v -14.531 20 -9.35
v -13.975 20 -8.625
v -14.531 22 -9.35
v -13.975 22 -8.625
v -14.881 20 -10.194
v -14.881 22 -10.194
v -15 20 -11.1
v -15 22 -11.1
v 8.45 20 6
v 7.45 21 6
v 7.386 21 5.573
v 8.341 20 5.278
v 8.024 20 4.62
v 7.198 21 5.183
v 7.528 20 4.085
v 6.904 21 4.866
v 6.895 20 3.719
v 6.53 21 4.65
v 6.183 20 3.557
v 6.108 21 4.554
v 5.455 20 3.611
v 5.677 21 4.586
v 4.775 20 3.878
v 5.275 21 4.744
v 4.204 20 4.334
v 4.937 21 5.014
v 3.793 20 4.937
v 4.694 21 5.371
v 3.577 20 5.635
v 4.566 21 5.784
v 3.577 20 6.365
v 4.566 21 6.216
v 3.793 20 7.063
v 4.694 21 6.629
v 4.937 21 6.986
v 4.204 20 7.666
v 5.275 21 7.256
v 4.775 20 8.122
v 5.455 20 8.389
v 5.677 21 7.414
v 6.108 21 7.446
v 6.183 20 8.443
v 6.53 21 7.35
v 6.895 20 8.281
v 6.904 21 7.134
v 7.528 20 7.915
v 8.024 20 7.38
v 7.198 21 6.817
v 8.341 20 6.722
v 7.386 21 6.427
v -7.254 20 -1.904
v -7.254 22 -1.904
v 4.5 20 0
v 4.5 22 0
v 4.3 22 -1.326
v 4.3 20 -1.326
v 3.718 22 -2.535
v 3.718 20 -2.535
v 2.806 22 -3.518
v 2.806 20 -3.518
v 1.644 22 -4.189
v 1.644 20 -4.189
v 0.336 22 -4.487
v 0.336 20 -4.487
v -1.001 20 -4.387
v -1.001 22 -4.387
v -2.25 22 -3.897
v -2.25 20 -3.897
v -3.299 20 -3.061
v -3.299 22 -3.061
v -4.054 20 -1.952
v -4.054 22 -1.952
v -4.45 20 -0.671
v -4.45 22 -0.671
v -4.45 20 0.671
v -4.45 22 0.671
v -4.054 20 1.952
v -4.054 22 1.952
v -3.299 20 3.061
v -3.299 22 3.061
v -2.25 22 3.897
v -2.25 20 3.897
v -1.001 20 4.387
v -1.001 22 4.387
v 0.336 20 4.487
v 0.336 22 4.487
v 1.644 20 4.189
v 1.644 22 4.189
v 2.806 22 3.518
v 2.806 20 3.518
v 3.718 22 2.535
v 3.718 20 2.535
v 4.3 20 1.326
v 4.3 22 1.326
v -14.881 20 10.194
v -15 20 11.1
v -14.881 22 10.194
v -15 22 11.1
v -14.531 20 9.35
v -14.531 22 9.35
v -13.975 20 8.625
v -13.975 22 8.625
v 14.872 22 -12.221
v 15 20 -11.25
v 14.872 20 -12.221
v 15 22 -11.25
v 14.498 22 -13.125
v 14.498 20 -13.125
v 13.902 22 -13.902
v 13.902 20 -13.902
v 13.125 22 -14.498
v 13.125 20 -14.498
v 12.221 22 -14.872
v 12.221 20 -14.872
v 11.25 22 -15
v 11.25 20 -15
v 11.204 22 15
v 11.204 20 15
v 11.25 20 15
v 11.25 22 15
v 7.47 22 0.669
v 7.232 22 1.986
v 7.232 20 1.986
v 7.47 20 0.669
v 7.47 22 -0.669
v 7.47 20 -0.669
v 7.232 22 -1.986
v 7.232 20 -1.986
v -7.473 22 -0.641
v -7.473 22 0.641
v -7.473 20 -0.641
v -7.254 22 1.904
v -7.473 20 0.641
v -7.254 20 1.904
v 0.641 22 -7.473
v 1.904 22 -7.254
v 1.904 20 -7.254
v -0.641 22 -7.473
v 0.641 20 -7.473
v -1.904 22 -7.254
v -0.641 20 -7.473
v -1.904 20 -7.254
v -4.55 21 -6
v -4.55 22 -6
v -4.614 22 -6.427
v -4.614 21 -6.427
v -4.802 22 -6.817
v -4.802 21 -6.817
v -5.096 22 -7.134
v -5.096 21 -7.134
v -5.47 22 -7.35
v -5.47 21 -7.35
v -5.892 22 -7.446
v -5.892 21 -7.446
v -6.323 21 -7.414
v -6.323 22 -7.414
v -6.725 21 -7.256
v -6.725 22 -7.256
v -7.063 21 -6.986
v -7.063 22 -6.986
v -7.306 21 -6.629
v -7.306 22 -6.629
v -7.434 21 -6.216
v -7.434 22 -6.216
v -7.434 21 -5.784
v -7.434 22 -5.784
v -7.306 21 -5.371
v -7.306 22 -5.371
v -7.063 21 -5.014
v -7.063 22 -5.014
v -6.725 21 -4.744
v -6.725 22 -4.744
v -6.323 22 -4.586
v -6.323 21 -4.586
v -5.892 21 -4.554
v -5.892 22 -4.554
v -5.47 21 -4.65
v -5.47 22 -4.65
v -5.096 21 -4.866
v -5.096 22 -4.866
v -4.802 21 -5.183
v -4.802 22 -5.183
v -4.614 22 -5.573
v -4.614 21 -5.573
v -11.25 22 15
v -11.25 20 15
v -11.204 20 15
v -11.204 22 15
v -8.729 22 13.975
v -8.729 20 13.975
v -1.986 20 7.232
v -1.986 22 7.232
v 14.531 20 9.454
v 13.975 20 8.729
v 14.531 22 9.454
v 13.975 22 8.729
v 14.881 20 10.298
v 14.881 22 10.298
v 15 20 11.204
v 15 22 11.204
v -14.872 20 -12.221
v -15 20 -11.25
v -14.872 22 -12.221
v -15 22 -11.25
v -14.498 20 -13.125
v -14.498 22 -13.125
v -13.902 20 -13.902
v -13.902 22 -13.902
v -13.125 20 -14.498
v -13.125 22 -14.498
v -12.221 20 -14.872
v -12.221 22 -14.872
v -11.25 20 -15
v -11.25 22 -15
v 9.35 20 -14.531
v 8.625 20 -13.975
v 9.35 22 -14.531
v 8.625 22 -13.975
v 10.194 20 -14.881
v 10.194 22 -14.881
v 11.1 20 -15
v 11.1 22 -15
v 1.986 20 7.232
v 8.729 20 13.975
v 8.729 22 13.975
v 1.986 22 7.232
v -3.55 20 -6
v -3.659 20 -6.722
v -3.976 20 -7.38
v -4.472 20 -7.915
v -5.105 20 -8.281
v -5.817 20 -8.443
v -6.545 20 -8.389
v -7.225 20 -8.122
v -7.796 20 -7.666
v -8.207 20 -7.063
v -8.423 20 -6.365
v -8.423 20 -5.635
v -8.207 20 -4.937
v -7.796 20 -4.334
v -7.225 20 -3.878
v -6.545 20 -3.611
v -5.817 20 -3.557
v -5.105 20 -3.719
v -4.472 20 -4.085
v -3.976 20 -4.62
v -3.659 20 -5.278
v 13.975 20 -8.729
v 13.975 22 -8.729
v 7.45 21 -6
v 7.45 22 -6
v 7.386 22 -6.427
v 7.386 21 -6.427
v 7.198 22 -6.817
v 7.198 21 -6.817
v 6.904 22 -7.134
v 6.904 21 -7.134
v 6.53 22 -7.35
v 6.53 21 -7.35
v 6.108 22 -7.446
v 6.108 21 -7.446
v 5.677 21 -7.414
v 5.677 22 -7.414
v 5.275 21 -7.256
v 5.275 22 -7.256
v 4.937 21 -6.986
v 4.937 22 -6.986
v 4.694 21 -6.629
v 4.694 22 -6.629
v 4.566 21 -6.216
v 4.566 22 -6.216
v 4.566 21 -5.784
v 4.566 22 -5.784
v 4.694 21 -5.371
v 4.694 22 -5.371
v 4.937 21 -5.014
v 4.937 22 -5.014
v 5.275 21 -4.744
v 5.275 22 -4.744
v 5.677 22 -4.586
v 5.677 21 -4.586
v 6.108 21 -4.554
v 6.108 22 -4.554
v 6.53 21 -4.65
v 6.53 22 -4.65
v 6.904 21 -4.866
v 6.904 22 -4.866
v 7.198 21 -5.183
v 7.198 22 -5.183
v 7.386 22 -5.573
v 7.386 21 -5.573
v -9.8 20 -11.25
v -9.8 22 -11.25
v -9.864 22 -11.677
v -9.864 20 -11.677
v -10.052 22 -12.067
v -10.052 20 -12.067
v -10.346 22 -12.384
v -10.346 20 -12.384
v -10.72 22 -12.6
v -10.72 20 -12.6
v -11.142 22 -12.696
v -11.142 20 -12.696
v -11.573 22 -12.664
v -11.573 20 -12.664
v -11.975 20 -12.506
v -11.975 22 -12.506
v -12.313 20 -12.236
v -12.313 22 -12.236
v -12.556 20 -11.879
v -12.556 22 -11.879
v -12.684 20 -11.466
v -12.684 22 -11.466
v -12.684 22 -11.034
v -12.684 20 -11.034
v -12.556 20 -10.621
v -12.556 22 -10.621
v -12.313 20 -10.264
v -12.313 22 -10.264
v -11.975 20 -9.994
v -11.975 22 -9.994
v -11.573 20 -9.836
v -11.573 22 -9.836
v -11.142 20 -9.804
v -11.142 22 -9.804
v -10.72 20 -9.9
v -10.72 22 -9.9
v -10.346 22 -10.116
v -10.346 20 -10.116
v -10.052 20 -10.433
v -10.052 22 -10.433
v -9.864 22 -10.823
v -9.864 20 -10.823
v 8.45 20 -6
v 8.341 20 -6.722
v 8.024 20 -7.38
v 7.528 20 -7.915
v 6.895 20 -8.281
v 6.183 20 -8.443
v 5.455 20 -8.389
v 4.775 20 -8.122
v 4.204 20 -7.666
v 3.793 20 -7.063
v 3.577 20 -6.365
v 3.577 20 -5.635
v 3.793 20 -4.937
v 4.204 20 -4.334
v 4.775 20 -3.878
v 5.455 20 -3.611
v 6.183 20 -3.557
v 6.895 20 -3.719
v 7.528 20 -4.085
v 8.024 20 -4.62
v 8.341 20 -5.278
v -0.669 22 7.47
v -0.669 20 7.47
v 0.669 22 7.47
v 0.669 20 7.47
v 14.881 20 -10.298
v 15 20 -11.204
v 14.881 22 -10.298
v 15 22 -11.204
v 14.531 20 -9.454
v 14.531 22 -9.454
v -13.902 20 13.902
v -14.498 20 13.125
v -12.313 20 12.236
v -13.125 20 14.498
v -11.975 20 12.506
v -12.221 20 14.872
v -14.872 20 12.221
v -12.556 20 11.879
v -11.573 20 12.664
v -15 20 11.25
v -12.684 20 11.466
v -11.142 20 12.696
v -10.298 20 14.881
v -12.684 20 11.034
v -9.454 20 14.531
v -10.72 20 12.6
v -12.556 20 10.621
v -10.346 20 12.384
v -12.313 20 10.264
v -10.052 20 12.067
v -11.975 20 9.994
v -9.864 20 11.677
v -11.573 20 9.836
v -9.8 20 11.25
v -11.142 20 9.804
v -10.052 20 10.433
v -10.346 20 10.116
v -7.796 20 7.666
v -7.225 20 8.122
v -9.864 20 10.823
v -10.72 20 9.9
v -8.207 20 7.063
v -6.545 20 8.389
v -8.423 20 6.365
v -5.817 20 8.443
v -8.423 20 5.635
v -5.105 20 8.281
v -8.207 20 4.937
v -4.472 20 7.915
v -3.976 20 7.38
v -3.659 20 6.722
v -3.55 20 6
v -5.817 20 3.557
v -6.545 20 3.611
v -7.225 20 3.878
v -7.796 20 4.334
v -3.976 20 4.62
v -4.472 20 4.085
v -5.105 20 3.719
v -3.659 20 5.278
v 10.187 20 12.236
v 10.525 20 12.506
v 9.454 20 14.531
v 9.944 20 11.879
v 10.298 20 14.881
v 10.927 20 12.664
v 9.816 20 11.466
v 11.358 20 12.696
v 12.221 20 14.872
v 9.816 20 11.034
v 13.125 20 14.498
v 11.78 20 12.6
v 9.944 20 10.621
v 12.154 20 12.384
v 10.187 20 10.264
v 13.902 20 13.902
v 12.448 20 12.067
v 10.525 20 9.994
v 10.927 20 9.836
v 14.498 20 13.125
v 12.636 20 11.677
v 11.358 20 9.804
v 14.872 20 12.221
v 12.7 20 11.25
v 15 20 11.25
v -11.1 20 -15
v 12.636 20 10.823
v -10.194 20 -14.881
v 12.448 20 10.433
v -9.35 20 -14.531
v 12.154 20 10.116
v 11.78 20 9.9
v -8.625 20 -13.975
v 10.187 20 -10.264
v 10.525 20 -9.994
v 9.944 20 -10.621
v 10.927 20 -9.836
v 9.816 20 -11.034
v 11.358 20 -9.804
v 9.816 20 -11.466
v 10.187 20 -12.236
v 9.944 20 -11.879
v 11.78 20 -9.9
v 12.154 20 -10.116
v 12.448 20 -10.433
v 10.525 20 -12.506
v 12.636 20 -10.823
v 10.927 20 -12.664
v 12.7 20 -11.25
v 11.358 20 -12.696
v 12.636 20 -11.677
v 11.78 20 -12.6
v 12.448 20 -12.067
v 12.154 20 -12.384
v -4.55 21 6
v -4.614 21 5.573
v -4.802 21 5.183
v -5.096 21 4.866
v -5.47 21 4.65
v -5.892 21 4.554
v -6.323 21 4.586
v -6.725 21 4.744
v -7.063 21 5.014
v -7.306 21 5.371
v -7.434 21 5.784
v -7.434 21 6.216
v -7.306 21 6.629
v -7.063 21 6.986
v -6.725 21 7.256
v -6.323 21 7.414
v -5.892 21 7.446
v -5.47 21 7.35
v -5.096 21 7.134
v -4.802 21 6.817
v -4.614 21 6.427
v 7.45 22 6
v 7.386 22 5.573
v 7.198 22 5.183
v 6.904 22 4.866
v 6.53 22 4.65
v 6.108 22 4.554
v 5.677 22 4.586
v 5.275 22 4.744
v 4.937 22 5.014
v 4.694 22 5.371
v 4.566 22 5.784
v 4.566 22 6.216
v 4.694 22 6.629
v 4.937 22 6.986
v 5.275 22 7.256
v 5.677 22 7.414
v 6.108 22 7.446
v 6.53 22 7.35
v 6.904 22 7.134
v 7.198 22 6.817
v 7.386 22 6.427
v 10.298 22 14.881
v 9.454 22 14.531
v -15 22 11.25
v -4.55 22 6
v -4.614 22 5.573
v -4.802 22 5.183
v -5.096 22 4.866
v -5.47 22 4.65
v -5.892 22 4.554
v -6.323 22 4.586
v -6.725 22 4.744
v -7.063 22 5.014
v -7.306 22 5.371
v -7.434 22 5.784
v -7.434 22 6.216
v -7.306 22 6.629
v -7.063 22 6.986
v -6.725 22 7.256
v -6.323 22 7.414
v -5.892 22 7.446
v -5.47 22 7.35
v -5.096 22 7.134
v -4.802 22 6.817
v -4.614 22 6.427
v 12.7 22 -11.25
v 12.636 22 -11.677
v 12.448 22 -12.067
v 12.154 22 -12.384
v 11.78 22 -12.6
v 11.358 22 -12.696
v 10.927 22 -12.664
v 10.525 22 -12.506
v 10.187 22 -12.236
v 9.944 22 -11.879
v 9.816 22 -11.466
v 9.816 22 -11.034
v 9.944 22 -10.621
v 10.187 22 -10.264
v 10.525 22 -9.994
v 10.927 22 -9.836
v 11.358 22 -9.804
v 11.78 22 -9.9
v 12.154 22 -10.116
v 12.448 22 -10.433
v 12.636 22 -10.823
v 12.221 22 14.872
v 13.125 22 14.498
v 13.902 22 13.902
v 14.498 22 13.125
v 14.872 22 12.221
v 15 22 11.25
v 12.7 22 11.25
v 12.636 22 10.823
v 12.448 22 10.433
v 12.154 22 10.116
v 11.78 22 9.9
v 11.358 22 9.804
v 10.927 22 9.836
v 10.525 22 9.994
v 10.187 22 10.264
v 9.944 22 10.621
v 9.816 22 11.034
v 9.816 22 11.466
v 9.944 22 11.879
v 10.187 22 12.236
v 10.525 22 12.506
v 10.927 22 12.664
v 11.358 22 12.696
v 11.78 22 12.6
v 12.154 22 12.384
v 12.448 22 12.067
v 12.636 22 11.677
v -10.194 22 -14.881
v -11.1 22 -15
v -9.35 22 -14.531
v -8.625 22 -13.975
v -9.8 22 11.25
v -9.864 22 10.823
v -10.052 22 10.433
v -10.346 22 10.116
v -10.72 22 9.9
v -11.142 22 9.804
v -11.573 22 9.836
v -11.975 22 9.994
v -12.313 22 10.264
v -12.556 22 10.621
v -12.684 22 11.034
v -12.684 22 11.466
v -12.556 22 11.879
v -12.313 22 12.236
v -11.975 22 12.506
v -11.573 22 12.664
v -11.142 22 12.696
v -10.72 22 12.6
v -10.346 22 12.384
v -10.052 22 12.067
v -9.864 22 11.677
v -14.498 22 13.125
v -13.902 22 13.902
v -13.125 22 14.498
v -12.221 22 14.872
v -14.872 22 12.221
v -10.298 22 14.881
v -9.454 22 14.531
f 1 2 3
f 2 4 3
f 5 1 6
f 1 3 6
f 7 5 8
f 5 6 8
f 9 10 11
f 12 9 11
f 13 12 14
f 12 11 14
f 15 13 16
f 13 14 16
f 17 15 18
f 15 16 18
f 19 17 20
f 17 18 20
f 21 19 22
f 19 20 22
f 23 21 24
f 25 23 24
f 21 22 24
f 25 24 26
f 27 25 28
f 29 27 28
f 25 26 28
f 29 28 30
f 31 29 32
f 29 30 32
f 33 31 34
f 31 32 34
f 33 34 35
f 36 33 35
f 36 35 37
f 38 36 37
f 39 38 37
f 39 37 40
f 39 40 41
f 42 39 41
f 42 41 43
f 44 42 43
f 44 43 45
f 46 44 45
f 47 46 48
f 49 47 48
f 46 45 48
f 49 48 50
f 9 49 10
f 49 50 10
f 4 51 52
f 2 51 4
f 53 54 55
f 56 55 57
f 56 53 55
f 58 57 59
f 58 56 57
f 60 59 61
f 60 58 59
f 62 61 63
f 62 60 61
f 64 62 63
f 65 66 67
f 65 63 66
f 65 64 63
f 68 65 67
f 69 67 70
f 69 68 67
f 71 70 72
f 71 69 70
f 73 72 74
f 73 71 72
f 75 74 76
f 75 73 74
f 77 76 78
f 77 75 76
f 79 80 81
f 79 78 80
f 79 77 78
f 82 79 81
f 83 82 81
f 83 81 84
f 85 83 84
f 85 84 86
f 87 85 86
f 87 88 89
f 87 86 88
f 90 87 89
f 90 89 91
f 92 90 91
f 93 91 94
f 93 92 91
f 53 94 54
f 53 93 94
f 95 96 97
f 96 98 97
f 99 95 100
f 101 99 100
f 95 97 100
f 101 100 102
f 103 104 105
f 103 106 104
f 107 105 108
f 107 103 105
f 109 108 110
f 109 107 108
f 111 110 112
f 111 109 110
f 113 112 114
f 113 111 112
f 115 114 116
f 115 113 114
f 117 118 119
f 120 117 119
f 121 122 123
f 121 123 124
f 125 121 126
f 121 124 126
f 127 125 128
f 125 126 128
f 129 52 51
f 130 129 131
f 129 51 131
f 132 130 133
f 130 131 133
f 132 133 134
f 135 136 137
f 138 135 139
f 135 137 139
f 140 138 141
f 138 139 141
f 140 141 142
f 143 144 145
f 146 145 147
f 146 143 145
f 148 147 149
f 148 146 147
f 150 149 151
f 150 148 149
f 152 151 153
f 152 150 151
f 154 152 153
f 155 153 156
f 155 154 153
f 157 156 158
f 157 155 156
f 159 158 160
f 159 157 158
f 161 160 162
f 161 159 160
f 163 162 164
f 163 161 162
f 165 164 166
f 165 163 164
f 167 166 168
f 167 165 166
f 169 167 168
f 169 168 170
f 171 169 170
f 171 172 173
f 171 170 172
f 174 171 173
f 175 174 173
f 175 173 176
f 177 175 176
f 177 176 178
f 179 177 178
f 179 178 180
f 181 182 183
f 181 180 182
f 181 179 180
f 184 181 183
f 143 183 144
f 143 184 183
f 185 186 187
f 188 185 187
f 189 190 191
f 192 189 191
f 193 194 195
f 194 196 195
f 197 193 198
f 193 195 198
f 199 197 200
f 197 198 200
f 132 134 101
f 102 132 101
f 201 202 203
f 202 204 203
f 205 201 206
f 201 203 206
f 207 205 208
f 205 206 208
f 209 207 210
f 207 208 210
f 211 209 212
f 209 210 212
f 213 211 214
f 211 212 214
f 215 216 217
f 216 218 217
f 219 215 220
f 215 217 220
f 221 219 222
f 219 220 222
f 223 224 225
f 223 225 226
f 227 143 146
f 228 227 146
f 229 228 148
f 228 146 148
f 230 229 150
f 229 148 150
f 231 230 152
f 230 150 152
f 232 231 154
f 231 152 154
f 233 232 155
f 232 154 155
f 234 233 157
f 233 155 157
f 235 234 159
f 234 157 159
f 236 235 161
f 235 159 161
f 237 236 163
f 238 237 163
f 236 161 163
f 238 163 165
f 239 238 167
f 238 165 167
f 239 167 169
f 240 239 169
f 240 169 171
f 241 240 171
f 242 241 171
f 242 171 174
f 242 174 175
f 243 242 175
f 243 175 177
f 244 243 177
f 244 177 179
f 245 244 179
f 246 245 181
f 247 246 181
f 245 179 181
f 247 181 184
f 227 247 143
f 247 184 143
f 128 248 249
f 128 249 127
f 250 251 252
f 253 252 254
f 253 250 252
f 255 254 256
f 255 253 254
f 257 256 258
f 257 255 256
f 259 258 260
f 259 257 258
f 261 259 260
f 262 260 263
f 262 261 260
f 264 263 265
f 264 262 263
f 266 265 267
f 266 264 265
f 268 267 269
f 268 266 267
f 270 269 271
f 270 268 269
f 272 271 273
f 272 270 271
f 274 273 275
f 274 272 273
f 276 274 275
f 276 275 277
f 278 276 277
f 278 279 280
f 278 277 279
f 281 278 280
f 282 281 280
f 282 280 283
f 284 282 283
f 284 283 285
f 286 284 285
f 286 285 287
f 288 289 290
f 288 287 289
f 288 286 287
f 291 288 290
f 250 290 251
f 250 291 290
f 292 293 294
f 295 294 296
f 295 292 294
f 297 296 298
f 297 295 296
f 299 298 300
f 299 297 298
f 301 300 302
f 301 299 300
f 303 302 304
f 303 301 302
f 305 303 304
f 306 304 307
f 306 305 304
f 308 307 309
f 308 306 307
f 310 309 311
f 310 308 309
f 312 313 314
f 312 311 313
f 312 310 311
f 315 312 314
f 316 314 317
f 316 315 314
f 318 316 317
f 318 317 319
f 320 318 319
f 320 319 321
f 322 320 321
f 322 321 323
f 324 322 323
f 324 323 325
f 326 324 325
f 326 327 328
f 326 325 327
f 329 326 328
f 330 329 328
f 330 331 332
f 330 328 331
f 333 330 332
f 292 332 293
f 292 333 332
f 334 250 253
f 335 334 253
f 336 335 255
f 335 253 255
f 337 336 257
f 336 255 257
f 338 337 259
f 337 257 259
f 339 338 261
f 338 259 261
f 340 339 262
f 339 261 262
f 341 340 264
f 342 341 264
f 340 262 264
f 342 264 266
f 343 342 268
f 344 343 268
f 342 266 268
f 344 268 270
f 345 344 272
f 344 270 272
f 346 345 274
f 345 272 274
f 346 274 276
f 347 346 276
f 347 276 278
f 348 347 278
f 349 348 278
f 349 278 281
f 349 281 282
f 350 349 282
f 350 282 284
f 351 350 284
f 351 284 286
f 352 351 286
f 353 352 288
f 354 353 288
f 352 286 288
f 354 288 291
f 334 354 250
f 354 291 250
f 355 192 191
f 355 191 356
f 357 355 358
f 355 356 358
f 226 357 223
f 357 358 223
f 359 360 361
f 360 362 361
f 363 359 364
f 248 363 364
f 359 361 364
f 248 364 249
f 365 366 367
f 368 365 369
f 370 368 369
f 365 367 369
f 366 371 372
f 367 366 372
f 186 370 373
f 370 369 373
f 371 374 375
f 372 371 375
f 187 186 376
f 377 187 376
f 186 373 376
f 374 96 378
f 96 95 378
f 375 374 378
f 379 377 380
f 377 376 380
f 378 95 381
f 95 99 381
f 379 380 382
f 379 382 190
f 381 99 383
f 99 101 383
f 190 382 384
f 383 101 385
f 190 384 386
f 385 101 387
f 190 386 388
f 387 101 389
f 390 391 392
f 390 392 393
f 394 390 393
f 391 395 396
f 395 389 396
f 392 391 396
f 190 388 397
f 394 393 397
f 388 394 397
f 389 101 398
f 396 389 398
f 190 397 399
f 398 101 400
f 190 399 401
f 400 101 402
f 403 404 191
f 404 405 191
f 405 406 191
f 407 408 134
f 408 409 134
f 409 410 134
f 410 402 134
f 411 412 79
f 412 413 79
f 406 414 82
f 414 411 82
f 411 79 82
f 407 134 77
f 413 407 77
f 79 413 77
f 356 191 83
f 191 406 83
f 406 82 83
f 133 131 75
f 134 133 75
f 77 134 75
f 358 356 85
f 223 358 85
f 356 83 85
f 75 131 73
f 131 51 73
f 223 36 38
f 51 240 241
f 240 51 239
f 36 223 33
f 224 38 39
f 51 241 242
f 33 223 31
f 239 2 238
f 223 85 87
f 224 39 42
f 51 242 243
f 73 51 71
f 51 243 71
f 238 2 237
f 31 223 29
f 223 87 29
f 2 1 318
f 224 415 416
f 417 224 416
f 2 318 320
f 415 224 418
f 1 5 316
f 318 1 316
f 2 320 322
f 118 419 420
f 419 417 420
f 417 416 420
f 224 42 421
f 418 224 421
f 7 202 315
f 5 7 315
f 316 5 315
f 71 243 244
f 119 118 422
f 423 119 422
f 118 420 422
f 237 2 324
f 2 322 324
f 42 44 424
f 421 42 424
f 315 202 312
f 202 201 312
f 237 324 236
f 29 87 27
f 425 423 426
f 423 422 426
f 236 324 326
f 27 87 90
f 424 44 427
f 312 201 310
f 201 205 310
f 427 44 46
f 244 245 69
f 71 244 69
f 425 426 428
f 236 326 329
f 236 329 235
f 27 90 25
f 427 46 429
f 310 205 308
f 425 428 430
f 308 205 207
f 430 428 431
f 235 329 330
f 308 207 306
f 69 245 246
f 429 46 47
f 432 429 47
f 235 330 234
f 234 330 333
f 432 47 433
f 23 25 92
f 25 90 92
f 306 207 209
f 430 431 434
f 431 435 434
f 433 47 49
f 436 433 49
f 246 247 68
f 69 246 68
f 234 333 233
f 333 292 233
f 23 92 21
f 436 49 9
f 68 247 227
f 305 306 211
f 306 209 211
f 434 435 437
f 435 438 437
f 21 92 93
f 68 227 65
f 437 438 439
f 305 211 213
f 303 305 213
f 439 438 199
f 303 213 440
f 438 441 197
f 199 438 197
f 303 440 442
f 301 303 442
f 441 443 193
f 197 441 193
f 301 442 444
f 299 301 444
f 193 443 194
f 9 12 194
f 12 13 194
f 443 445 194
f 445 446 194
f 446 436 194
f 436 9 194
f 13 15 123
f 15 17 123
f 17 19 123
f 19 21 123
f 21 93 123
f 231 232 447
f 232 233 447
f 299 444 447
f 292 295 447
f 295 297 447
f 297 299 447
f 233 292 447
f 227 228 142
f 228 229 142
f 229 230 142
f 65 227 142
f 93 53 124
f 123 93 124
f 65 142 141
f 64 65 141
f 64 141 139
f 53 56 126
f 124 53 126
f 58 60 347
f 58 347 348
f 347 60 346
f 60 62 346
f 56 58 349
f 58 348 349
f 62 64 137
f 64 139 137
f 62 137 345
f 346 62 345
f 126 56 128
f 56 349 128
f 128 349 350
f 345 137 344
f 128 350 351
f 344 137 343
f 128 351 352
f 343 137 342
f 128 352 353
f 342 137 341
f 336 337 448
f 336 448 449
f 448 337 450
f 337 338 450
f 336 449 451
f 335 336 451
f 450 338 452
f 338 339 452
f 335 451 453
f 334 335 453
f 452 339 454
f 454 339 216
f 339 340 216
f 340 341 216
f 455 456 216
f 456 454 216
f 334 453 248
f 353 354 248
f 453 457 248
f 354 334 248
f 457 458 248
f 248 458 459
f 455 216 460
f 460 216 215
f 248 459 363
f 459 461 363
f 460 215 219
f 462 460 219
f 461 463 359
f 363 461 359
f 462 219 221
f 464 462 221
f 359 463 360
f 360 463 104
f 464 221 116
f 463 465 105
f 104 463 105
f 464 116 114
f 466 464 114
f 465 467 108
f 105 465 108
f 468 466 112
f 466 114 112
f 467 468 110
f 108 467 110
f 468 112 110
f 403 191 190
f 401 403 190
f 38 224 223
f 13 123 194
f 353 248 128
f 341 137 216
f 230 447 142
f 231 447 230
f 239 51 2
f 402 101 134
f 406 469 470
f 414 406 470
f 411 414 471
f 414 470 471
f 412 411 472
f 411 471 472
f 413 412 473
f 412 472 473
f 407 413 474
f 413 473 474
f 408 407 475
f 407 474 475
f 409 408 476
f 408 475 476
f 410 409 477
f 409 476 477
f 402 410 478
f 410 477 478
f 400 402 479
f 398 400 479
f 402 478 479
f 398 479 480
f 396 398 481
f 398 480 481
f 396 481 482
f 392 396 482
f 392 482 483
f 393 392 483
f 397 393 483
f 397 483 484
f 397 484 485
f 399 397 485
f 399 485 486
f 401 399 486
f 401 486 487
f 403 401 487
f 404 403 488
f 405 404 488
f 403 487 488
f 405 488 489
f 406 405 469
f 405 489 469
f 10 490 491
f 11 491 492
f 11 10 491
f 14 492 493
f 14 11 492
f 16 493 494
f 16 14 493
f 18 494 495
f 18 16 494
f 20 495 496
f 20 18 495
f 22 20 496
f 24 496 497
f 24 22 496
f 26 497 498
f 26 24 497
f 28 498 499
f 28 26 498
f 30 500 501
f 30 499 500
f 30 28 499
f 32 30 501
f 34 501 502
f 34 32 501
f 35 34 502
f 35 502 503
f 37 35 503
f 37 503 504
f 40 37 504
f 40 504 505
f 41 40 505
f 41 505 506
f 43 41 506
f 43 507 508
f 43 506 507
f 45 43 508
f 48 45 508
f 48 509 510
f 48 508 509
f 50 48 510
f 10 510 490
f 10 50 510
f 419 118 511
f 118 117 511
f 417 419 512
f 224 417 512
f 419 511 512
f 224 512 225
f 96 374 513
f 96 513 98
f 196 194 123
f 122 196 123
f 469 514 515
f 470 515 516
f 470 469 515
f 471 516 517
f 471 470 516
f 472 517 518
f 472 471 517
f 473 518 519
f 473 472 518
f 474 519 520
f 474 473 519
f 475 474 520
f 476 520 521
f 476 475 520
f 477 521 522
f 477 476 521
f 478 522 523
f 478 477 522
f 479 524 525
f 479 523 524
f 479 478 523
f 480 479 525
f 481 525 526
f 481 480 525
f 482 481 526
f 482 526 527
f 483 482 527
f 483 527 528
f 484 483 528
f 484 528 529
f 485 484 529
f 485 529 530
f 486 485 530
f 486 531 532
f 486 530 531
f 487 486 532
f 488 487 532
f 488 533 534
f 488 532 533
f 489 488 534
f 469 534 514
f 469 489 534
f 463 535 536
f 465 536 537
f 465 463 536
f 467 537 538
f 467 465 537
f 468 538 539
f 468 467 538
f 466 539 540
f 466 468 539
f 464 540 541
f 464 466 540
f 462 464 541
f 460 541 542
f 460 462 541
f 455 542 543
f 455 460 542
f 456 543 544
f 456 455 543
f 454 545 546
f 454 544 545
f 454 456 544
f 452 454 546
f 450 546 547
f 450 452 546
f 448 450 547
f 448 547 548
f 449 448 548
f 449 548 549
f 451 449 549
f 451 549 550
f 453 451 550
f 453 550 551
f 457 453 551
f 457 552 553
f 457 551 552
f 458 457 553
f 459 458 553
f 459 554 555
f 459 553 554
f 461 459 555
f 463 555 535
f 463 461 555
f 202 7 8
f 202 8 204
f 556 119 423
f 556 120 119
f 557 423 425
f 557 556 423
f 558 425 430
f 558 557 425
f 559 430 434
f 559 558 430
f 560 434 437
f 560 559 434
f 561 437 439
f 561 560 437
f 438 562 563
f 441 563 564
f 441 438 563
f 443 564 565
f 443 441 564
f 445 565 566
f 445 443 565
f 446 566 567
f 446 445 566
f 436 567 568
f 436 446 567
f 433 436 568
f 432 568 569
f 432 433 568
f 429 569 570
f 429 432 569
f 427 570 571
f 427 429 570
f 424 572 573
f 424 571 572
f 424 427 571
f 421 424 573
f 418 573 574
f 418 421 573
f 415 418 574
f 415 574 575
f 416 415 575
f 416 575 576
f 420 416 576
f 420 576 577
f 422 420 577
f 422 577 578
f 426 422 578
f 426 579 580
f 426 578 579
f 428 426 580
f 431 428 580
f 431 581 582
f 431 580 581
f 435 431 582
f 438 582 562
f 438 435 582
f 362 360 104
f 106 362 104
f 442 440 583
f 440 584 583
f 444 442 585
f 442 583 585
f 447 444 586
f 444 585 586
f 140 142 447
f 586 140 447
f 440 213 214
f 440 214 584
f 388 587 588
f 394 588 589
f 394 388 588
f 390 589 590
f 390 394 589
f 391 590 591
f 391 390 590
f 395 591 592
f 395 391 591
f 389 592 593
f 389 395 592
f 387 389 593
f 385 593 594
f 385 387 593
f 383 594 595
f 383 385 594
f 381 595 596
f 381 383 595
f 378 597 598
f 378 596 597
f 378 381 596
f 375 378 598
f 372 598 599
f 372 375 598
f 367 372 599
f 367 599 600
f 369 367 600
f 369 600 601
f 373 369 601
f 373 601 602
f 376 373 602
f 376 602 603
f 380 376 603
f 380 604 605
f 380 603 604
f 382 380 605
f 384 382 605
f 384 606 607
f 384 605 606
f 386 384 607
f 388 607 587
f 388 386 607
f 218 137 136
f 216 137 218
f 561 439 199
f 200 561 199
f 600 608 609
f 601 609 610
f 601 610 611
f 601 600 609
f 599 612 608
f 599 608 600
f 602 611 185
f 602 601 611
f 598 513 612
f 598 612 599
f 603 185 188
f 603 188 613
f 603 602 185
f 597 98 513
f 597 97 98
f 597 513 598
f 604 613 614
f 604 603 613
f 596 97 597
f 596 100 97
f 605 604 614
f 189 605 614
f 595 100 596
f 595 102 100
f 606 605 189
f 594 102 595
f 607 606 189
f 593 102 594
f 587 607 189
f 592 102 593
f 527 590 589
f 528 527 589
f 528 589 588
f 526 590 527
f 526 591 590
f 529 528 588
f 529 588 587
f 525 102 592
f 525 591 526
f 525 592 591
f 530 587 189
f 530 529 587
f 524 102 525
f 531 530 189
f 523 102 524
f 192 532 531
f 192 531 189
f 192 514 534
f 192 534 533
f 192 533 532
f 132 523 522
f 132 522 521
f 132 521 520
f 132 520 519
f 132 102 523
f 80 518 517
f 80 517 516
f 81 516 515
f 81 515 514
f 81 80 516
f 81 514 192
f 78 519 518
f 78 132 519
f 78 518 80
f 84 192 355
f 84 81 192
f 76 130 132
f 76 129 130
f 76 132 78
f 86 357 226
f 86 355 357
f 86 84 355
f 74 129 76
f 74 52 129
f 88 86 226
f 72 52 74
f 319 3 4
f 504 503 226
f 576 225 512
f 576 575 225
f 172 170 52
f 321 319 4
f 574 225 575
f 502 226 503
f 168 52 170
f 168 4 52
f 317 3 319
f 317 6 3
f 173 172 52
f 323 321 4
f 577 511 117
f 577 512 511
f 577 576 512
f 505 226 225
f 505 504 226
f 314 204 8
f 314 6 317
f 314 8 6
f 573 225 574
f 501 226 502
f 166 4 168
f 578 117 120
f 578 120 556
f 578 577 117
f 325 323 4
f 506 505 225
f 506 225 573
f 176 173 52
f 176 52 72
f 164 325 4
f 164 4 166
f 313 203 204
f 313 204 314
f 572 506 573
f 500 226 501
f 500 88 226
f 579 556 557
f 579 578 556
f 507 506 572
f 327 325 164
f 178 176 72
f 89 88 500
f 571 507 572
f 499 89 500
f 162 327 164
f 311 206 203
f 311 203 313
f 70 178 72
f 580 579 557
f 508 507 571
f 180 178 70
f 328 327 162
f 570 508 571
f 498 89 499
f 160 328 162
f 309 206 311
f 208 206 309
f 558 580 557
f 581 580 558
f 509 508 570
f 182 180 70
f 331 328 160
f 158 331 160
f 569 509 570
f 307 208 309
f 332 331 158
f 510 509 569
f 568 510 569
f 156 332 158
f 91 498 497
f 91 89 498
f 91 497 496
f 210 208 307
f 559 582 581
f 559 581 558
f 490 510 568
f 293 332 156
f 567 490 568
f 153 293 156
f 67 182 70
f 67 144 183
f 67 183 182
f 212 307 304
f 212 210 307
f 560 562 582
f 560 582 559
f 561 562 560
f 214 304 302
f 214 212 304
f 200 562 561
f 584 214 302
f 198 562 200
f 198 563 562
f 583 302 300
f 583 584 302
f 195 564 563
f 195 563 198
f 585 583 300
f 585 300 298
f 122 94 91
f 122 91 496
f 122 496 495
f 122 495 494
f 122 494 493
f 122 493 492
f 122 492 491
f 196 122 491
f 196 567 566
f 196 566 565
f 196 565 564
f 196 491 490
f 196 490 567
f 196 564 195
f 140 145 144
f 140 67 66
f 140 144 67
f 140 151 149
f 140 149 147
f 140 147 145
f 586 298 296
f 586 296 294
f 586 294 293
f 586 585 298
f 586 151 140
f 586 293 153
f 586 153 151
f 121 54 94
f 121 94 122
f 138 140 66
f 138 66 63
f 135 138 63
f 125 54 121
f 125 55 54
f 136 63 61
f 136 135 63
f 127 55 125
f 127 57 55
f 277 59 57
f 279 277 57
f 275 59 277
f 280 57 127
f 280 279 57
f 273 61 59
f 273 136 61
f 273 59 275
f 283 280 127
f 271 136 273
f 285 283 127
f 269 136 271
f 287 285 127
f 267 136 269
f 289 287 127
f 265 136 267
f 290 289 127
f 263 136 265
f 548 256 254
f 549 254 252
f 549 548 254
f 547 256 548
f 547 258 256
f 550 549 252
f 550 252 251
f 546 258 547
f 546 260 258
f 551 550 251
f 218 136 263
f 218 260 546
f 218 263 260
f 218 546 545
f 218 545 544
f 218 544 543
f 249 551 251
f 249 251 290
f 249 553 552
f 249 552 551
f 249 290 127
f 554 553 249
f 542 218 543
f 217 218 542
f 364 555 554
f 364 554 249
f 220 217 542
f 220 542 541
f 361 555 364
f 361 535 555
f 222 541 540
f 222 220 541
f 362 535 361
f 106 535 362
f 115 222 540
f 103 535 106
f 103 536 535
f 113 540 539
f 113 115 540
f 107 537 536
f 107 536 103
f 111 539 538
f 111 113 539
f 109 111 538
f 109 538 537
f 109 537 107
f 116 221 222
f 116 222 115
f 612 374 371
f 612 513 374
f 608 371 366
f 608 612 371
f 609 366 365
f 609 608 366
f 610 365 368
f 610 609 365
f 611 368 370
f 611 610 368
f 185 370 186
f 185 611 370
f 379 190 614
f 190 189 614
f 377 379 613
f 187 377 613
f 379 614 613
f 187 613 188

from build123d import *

# Parameters (mm, degrees)
CYLINDER006_R              = 1.45
CYLINDER006_DEPTH          = 10
CYLINDER007_R              = 1.45
CYLINDER007_DEPTH          = 10
CYLINDER008_R              = 1.45
CYLINDER008_DEPTH          = 10
CYLINDER009_R              = 1.45
CYLINDER009_DEPTH          = 10
CYLINDER005_R              = 1.45
CYLINDER005_DEPTH          = 10
CYLINDER002_R              = 1.45
CYLINDER002_DEPTH          = 10
CYLINDER003_R              = 1.45
CYLINDER003_DEPTH          = 10
CYLINDER004_R              = 1.45
CYLINDER004_DEPTH          = 10
CYLINDER001_R              = 4.5
CYLINDER001_DEPTH          = 10
CYLINDER_R                 = 7.5
CYLINDER_DEPTH             = 15
BOX001_W                   = 20
BOX001_H                   = 20
BOX001_DEPTH               = 10
BOX001_PLACEMENT_ANGLE     = 45
BOX002_W                   = 20
BOX002_H                   = 20
BOX002_DEPTH               = 10
BOX002_PLACEMENT_ANGLE     = 45
CLONE_PLACEMENT_ANGLE      = 90
BOX_W                      = 30
BOX_H                      = 30
BOX_DEPTH                  = 2
FILLET_R                   = 3.75
FILLET001_R                = 3.5
CUT010_PLACEMENT_ANGLE     = 90
CHAMFER004_SIZE            = 1
CHAMFER004_PLACEMENT_ANGLE = 180


with BuildPart() as cylinder006:
    # Cylinder006 → Cylinder006 (new body)
    with BuildSketch(Plane(origin=(11.25, -11.25, 0), x_dir=(1, 0, 0), z_dir=(0, 0, 1))):
        Circle(CYLINDER006_R)
    extrude(amount=CYLINDER006_DEPTH)


with BuildPart() as cylinder007:
    # Cylinder007 → Cylinder007 (new body)
    with BuildSketch(Plane(origin=(11.25, 11.25, 0), x_dir=(1, 0, 0), z_dir=(0, 0, 1))):
        Circle(CYLINDER007_R)
    extrude(amount=CYLINDER007_DEPTH)


with BuildPart() as cylinder008:
    # Cylinder008 → Cylinder008 (new body)
    with BuildSketch(Plane(origin=(-11.25, -11.25, 0), x_dir=(1, 0, 0), z_dir=(0, 0, 1))):
        Circle(CYLINDER008_R)
    extrude(amount=CYLINDER008_DEPTH)


with BuildPart() as cylinder009:
    # Cylinder009 → Cylinder009 (new body)
    with BuildSketch(Plane(origin=(-11.25, 11.25, 0), x_dir=(1, 0, 0), z_dir=(0, 0, 1))):
        Circle(CYLINDER009_R)
    extrude(amount=CYLINDER009_DEPTH)


with BuildPart() as cylinder005:
    # Cylinder005 → Cylinder005 (new body)
    with BuildSketch(Plane(origin=(6, -6, 0), x_dir=(1, 0, 0), z_dir=(0, 0, 1))):
        Circle(CYLINDER005_R)
    extrude(amount=CYLINDER005_DEPTH)


with BuildPart() as cylinder002:
    # Cylinder002 → Cylinder002 (new body)
    with BuildSketch(Plane(origin=(6, 6, 0), x_dir=(1, 0, 0), z_dir=(0, 0, 1))):
        Circle(CYLINDER002_R)
    extrude(amount=CYLINDER002_DEPTH)


with BuildPart() as cylinder003:
    # Cylinder003 → Cylinder003 (new body)
    with BuildSketch(Plane(origin=(-6, 6, 0), x_dir=(1, 0, 0), z_dir=(0, 0, 1))):
        Circle(CYLINDER003_R)
    extrude(amount=CYLINDER003_DEPTH)


with BuildPart() as cylinder004:
    # Cylinder004 → Cylinder004 (new body)
    with BuildSketch(Plane(origin=(-6, -6, 0), x_dir=(1, 0, 0), z_dir=(0, 0, 1))):
        Circle(CYLINDER004_R)
    extrude(amount=CYLINDER004_DEPTH)


with BuildPart() as cylinder001:
    # Cylinder001 → Cylinder001 (new body)
    with BuildSketch(Plane.XY):
        Circle(CYLINDER001_R)
    extrude(amount=CYLINDER001_DEPTH)


with BuildPart() as cylinder:
    # Cylinder → Cylinder (new body)
    with BuildSketch(Plane.XY):
        Circle(CYLINDER_R)
    extrude(amount=CYLINDER_DEPTH)


with BuildPart() as cube001:
    # Box001 → Box001 (new body)
    with BuildSketch(Plane.XY):
        with Locations((10, 10)):
            Rectangle(BOX001_W, BOX001_H)
    extrude(amount=BOX001_DEPTH)


with BuildPart() as cube001_1:
    # Box001 placement: moved
    add(cube001.part.moved(Location((0, -33.53, 0))).rotate(Axis((0, -33.53, 0), (0, 0, 1)), BOX001_PLACEMENT_ANGLE))


with BuildPart() as cut:
    # Box002 → Box002 (new body)
    with BuildSketch(Plane.XY):
        with Locations((10, 10)):
            Rectangle(BOX002_W, BOX002_H)
    extrude(amount=BOX002_DEPTH)


with BuildPart() as cut_1:
    # Box002 placement: moved
    add(cut.part.moved(Location((0, 5.35, 0))).rotate(Axis((0, 5.35, 0), (0, 0, 1)), BOX002_PLACEMENT_ANGLE))

    # Fusion: union Cube001
    add(cube001_1.part)

    # Cut: cut Cylinder
    add(cylinder.part, mode=Mode.SUBTRACT)


with BuildPart() as cut001:
    # Clone base: copy of Cut
    add(cut_1.part)


with BuildPart() as cut001_1:
    # Clone placement: moved
    add(cut001.part.rotate(Axis((0, 0, 0), (0, 0, 1)), CLONE_PLACEMENT_ANGLE))


with BuildPart() as fusion001:
    # Fusion001 base: copy of Cut
    add(cut_1.part)

    # Fusion001: union Cut001
    add(cut001_1.part)


with BuildPart() as alummount:
    # Box → Box (new body)
    with BuildSketch(Plane(origin=(-15, -15, 0), x_dir=(1, 0, 0), z_dir=(0, 0, 1))):
        with Locations((15, 15)):
            Rectangle(BOX_W, BOX_H)
    extrude(amount=BOX_DEPTH)

    # Fillet
    fillet_edges = [alummount.edges().sort_by_distance(p)[0] for p in [
        (-15, -15, 1),
        (-15, 15, 1),
        (15, -15, 1),
        (15, 15, 1),
    ]]
    fillet(fillet_edges, radius=FILLET_R)

    # Cut001: cut Fusion001
    add(fusion001.part, mode=Mode.SUBTRACT)

    # Fillet001
    fillet001_edges = [alummount.edges().sort_by_distance(p)[0] for p in [
        (-15, -9.65, 1),
        (-15, 9.65, 1),
        (-9.65, 15, 1),
        (9.65, 15, 1),
        (15, 9.754271, 1),
        (15, -9.754271, 1),
        (9.754271, -15, 1),
        (-9.754271, -15, 1),
    ]]
    fillet(fillet001_edges, radius=FILLET001_R)

    # Cut002: cut Cylinder001
    add(cylinder001.part, mode=Mode.SUBTRACT)

    # Cut003: cut Cylinder004
    add(cylinder004.part, mode=Mode.SUBTRACT)

    # Cut004: cut Cylinder003
    add(cylinder003.part, mode=Mode.SUBTRACT)

    # Cut005: cut Cylinder002
    add(cylinder002.part, mode=Mode.SUBTRACT)

    # Cut006: cut Cylinder005
    add(cylinder005.part, mode=Mode.SUBTRACT)

    # Cut007: cut Cylinder009
    add(cylinder009.part, mode=Mode.SUBTRACT)

    # Cut008: cut Cylinder008
    add(cylinder008.part, mode=Mode.SUBTRACT)

    # Cut009: cut Cylinder007
    add(cylinder007.part, mode=Mode.SUBTRACT)

    # Cut010: cut Cylinder006
    add(cylinder006.part, mode=Mode.SUBTRACT)


with BuildPart() as alummount_1:
    # Cut010 placement: moved
    add(alummount.part.rotate(Axis((0, 0, 0), (1, 0, 0)), CUT010_PLACEMENT_ANGLE))

    # Chamfer004
    chamfer004_edges = [alummount_1.edges().sort_by_distance(p)[0] for p in [
        (4.55, 0, 6),
        (-7.45, 0, 6),
        (4.55, 0, -6),
        (-7.45, 0, -6),
    ]]
    chamfer(chamfer004_edges, length=CHAMFER004_SIZE)


with BuildPart() as alummount_2:
    # Chamfer004 placement: moved
    add(alummount_1.part.moved(Location((0, 20, 0))).rotate(Axis((0, 20, 0), (1, 0, 0)), CHAMFER004_PLACEMENT_ANGLE))


solid = alummount_2.part
